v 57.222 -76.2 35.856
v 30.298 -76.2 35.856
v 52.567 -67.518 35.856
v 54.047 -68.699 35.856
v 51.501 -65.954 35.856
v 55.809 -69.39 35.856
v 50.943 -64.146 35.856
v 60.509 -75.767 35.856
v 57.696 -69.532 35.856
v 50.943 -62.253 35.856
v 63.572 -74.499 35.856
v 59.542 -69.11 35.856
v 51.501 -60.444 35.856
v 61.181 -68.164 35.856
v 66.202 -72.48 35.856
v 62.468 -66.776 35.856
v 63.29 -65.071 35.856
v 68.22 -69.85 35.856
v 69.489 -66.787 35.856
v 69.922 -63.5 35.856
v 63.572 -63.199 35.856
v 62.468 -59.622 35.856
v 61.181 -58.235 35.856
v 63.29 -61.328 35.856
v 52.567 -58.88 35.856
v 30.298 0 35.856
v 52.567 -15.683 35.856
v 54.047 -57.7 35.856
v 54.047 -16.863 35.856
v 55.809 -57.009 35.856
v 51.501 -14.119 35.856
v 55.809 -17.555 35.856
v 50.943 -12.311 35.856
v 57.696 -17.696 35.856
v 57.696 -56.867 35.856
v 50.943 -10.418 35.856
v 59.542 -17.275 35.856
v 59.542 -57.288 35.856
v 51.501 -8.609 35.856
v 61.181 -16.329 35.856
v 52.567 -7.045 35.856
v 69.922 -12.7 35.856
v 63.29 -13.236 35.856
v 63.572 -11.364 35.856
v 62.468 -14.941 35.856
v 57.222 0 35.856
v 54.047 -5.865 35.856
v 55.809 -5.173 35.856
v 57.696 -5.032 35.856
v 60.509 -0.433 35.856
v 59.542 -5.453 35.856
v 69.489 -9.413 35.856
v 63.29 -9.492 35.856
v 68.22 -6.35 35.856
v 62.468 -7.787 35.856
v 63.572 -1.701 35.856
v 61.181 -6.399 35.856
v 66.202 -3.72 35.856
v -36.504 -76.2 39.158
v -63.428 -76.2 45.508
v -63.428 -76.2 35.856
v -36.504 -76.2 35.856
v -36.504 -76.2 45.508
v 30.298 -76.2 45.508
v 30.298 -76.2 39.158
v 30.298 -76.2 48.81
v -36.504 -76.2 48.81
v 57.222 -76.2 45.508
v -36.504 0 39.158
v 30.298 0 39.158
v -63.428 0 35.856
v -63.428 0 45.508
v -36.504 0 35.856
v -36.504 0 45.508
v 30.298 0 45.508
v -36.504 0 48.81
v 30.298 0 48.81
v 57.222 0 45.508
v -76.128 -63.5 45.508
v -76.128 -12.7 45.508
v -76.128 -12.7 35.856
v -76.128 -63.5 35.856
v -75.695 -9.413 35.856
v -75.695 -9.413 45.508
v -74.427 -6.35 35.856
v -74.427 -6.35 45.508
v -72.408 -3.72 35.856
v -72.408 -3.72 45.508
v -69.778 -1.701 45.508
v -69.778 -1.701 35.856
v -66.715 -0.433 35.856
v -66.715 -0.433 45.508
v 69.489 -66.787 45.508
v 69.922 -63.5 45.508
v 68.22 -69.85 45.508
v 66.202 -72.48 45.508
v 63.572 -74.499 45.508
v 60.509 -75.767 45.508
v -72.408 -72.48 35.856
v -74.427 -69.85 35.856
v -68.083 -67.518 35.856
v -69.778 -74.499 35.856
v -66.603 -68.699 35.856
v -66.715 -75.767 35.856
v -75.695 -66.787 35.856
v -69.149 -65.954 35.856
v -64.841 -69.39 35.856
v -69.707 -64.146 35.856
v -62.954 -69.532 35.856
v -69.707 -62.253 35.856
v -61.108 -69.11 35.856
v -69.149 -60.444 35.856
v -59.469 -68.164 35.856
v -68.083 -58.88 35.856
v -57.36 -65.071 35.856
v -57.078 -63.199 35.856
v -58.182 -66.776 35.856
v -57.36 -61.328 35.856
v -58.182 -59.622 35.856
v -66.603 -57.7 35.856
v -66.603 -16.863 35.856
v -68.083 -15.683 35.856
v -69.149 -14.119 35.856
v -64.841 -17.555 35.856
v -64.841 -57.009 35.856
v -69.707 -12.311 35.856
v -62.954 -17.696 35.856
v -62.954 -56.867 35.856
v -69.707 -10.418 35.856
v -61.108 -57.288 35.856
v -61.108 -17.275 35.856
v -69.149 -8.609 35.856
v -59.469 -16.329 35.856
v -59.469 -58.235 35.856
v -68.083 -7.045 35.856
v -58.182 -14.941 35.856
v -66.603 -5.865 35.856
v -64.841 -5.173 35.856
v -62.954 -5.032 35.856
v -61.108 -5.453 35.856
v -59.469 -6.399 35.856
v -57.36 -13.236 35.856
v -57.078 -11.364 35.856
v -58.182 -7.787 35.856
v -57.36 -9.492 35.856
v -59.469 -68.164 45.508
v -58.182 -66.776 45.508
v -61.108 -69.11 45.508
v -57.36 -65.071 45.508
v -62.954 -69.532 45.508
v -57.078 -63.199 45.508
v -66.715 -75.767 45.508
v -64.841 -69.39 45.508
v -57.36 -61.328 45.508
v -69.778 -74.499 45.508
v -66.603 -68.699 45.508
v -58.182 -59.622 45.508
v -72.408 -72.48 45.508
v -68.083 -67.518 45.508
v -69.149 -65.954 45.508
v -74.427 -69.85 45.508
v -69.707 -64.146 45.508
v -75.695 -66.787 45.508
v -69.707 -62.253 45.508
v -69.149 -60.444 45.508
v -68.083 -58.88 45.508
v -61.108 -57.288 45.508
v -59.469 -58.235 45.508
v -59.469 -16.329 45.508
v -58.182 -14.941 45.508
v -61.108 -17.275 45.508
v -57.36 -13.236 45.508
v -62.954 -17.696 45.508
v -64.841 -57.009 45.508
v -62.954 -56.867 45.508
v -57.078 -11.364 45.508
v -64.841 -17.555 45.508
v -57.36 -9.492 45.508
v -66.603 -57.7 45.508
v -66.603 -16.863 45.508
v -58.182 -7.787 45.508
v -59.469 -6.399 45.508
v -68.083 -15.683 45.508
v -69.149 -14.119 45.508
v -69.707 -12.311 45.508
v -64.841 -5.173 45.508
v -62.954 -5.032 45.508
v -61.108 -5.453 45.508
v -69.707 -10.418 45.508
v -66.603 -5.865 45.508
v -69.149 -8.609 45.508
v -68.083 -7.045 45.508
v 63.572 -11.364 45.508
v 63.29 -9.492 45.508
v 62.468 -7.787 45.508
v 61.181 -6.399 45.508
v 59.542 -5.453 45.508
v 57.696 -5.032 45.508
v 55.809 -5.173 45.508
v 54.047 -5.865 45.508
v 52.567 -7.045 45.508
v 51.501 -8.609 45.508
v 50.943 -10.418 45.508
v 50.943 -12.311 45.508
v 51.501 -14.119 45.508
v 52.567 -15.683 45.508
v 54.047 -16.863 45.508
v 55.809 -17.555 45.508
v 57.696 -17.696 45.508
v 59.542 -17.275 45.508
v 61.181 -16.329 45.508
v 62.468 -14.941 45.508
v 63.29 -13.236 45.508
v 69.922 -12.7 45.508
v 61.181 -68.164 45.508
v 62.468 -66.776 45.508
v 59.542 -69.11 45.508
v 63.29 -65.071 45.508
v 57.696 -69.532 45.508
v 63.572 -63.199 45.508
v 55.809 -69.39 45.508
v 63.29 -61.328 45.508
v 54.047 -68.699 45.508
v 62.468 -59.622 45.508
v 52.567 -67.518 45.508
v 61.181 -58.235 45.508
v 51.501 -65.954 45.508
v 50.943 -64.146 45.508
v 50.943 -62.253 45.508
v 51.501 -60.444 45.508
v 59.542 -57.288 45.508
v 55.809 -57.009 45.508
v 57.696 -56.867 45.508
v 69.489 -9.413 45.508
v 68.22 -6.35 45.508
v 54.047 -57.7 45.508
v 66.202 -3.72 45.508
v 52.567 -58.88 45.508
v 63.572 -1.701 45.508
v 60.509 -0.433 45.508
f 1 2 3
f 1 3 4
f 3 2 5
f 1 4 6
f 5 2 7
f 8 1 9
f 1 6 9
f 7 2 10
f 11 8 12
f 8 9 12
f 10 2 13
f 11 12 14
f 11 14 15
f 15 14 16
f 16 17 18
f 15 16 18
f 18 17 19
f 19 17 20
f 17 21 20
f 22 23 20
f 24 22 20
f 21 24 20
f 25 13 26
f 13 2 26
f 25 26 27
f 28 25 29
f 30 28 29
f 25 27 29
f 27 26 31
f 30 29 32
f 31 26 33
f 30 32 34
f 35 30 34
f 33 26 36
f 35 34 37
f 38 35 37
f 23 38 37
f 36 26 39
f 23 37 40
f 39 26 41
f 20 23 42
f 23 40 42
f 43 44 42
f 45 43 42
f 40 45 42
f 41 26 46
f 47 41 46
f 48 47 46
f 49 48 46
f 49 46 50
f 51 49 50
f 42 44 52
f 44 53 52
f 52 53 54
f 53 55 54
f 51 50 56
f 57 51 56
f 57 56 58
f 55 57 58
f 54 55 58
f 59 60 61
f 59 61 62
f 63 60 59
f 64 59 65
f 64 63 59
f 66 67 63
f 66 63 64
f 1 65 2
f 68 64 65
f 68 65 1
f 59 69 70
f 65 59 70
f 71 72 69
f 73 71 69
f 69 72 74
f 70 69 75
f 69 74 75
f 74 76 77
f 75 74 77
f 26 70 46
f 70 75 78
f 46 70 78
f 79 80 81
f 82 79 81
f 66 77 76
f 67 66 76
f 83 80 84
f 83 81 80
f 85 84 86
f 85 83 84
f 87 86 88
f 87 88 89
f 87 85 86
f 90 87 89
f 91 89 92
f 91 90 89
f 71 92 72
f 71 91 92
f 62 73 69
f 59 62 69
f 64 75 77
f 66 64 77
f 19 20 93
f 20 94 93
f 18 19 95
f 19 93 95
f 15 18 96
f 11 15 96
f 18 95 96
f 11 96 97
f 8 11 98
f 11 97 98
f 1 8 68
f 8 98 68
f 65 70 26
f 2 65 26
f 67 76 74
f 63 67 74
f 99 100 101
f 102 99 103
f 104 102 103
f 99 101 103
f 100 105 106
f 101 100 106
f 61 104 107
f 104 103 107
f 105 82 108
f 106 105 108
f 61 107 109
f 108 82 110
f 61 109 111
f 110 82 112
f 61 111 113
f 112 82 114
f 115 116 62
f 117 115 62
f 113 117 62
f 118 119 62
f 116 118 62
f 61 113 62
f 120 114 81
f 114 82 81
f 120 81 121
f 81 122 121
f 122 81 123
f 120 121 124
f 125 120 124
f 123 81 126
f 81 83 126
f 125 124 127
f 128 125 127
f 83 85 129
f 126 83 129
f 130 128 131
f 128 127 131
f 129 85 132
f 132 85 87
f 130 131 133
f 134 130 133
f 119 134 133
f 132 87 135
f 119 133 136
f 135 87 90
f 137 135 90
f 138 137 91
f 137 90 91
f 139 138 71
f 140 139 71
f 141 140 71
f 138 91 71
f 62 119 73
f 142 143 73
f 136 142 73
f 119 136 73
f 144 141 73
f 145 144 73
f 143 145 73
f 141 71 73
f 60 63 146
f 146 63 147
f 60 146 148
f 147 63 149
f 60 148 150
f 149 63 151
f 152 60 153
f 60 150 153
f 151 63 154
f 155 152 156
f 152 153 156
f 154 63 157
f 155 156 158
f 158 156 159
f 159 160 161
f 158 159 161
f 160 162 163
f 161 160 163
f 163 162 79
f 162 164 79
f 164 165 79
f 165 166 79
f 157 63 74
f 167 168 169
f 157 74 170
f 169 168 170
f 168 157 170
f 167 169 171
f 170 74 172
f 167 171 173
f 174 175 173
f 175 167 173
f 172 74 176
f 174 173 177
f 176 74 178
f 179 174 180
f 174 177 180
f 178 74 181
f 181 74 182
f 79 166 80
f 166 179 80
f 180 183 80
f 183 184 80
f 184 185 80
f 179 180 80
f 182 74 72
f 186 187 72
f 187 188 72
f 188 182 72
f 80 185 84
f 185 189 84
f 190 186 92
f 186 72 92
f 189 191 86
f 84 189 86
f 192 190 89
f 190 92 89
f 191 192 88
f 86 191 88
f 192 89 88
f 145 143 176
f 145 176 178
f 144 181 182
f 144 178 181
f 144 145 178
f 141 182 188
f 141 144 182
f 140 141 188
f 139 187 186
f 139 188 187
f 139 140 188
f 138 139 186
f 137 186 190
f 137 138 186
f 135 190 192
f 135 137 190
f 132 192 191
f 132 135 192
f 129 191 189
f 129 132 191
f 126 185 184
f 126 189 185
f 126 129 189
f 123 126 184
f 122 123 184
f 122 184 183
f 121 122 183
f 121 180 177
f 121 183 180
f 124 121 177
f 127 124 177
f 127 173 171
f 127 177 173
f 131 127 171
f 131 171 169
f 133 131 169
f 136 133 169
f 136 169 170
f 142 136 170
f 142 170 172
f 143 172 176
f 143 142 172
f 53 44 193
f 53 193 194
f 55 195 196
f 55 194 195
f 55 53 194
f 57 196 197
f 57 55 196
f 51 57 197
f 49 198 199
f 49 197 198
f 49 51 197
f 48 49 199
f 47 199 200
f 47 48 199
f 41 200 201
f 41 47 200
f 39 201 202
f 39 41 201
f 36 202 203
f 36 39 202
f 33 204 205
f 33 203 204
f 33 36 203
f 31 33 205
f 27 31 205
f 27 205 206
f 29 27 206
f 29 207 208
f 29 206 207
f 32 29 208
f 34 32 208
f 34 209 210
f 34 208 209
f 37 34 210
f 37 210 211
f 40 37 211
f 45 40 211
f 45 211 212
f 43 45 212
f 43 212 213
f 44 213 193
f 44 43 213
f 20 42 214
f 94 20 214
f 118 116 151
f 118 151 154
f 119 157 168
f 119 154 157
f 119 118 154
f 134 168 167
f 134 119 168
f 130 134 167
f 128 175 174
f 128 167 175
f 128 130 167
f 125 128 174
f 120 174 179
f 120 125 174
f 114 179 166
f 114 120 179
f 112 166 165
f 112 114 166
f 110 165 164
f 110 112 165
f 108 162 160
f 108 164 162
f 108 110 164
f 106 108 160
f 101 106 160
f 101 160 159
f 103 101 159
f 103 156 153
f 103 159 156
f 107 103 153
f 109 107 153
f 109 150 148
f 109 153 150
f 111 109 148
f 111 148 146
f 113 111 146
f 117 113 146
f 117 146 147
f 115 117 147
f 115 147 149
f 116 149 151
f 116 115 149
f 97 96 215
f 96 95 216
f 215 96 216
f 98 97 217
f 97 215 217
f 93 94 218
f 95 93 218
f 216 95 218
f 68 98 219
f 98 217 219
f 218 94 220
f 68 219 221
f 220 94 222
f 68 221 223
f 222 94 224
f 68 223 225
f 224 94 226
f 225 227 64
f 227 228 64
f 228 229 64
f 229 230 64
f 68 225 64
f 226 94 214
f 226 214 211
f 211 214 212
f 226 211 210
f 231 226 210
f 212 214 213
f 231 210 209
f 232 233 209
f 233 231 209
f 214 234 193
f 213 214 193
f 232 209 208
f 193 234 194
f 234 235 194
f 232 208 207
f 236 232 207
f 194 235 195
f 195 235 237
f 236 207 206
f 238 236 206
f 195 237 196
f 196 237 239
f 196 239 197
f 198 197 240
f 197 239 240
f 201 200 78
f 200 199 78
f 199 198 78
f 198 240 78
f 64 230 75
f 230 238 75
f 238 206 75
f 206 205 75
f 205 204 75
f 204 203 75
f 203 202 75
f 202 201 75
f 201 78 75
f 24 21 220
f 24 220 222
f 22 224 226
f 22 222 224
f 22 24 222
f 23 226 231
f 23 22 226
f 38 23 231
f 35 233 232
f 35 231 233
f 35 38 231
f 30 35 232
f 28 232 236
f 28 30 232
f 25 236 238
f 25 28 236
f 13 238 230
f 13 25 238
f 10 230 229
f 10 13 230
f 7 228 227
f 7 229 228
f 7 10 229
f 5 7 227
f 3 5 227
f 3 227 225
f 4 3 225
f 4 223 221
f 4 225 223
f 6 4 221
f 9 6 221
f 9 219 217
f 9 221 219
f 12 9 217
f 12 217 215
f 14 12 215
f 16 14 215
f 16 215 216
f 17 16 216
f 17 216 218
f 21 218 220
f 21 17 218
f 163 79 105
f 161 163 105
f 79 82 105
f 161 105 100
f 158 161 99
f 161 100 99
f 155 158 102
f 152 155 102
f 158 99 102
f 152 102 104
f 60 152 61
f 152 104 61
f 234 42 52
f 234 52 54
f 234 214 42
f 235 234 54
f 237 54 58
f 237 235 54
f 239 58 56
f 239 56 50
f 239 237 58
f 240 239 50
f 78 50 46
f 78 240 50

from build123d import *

# Parameters (mm, degrees)
F1_DEPTH = 76.2
F2_R     = 12.7
F3_R     = 6.35
F4_DEPTH = 48.811145


with BuildPart() as f1:
    # F0 (on Front) → F1 (new body)
    with BuildSketch(Plane.XZ):
        Polygon((-36.504163, 45.508145), (-76.128163, 45.508145), (-76.128163, 35.856145), (-36.504163, 35.856145), (-36.504163, 39.158145), (30.297837, 39.158145), (30.297837, 35.856145), (69.921837, 35.856145), (69.921837, 45.508145), (30.297837, 45.508145), (30.297837, 48.810145), (-36.504163, 48.810145), align=None)
    extrude(amount=F1_DEPTH)

    # F2
    f2_edges = [f1.edges().sort_by_distance(p)[0] for p in [
        (69.921837, 0, 40.682145),
        (69.921837, -76.2, 40.682145),
        (-76.128163, -76.2, 40.682145),
        (-76.128163, 0, 40.682145),
    ]]
    fillet(f2_edges, radius=F2_R)

    # F3 (on Top) → F4 (cut, through all)
    with BuildSketch(Plane.XY):
        with Locations((57.221837, -11.364109)):
            Circle(F3_R)
        with Locations((57.221837, -63.199298)):
            Circle(F3_R)
        with Locations((-63.428163, -63.199298)):
            Circle(F3_R)
        with Locations((-63.428163, -11.364109)):
            Circle(F3_R)
    extrude(amount=F4_DEPTH, mode=Mode.SUBTRACT)


solid = f1.part
